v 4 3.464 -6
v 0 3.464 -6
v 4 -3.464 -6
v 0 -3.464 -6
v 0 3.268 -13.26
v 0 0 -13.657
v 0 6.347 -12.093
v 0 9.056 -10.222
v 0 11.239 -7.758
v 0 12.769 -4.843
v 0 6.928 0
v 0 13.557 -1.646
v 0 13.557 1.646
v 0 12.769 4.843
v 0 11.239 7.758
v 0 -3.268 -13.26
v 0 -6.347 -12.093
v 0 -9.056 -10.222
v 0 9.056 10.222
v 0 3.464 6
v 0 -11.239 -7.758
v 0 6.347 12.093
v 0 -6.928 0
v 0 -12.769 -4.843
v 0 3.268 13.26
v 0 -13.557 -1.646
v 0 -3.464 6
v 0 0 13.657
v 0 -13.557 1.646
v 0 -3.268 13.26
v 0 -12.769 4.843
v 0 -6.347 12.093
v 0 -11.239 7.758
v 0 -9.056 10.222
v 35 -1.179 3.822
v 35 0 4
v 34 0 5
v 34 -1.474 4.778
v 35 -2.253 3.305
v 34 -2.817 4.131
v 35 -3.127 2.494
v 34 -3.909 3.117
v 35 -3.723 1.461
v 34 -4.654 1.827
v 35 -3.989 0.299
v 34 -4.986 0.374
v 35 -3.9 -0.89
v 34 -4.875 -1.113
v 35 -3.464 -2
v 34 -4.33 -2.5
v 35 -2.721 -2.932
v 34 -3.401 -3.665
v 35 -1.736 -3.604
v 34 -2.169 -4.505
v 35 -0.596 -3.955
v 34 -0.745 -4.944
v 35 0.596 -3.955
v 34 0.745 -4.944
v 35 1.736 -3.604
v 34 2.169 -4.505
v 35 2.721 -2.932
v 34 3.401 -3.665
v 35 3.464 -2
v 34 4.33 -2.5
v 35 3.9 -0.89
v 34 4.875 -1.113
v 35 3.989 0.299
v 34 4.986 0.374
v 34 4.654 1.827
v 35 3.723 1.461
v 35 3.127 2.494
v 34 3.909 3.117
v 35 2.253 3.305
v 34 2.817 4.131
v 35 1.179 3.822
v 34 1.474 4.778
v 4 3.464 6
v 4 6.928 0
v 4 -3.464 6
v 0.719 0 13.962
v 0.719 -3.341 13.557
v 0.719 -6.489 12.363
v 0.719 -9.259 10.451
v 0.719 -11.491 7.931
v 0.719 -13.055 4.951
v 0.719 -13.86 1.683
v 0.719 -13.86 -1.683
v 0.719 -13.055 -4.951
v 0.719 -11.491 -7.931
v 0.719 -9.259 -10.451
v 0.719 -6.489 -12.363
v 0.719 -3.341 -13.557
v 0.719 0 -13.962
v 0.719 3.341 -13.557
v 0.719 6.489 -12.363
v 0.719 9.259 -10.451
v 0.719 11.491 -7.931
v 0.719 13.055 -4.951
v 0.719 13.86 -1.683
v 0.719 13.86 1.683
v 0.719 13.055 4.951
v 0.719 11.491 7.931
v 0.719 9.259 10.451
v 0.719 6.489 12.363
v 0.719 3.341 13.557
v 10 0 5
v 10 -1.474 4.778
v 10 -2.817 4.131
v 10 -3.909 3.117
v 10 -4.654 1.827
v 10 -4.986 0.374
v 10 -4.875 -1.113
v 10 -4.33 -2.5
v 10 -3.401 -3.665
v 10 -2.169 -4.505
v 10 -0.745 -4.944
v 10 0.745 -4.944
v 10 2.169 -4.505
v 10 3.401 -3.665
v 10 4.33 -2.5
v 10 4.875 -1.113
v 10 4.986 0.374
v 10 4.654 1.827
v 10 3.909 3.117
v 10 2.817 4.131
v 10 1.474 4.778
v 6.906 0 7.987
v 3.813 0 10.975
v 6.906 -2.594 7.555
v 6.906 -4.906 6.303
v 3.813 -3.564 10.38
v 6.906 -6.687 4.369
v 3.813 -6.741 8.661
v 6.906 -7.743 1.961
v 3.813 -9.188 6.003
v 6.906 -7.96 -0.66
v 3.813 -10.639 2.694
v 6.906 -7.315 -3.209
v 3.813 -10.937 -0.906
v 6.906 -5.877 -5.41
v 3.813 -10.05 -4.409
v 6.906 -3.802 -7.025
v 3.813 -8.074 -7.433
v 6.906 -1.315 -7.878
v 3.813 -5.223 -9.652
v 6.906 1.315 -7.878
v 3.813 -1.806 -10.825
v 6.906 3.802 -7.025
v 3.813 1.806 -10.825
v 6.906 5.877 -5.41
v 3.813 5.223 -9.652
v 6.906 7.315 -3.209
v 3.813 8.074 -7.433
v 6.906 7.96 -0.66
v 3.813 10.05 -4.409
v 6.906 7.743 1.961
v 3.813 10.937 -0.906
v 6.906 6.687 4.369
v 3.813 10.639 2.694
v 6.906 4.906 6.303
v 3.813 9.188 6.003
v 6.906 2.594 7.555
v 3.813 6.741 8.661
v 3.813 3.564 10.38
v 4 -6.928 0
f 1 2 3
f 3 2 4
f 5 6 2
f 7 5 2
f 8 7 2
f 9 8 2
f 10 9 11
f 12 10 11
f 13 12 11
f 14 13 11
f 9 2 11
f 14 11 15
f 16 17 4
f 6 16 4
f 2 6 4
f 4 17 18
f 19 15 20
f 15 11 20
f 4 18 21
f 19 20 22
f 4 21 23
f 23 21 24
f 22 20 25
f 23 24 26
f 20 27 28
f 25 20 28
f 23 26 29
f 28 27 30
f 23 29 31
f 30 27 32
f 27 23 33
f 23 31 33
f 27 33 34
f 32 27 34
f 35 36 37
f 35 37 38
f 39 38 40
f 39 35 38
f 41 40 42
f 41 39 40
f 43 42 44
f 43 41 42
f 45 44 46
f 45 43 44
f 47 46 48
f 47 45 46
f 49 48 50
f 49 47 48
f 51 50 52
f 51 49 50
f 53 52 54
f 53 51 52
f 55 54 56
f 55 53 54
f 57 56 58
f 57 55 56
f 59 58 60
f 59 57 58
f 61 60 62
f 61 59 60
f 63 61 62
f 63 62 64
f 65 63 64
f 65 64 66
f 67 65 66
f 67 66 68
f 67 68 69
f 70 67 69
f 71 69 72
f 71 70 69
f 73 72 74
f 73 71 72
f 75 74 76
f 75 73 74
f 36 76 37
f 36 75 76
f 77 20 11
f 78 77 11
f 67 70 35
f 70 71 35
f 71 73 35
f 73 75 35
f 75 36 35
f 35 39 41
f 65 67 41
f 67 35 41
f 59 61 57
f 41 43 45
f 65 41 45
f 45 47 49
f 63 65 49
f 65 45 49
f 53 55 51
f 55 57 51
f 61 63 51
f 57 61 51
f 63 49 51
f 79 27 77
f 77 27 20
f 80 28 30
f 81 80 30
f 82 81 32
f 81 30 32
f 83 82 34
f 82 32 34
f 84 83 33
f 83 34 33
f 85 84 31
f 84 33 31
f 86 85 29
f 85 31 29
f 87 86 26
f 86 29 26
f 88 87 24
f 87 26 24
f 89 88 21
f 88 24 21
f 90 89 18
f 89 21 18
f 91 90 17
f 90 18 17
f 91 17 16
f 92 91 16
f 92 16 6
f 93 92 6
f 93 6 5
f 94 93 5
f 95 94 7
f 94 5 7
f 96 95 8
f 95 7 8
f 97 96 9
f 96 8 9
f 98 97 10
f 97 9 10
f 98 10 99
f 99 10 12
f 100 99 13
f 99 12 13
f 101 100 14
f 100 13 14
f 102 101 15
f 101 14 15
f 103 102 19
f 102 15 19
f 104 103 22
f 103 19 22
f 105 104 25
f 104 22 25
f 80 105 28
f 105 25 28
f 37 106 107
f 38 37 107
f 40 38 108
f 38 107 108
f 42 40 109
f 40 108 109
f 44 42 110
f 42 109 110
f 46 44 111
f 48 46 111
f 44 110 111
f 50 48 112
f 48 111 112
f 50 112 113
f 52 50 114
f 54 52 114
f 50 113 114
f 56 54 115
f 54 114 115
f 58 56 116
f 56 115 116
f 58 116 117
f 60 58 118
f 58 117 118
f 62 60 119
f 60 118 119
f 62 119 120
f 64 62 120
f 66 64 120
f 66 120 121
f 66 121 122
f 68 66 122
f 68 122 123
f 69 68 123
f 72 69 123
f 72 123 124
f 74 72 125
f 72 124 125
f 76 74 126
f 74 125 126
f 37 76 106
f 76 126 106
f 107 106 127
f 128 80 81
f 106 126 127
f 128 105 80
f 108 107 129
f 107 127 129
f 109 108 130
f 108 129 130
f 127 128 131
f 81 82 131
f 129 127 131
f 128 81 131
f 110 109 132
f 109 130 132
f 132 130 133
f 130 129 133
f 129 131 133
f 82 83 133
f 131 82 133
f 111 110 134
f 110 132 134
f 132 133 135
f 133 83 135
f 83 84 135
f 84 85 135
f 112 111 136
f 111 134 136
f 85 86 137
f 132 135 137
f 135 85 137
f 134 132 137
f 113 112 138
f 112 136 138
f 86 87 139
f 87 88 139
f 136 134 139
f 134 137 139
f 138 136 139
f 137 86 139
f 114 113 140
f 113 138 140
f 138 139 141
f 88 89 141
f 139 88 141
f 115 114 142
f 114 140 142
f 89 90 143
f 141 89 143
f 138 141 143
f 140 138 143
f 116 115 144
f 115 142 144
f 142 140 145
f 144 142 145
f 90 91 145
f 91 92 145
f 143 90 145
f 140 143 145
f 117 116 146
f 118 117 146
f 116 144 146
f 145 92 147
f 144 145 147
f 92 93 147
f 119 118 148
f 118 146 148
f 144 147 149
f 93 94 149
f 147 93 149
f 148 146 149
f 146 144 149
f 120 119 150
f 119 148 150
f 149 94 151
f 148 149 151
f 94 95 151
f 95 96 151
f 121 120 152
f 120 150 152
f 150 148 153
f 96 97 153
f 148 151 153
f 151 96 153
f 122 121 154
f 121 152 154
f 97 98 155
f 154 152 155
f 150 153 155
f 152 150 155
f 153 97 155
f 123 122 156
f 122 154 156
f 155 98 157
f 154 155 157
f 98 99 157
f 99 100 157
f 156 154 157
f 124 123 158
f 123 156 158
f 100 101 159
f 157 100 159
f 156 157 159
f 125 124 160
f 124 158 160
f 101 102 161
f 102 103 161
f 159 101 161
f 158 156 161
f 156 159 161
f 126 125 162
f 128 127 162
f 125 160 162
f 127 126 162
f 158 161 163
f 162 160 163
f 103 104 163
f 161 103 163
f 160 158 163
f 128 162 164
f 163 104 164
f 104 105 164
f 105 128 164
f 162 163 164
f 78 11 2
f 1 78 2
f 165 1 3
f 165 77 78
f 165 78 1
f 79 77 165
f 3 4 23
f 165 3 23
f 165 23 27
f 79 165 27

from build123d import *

# Parameters (mm, degrees)
F3_DEPTH = 4
F4_SIZE  = 1
F5_SIZE  = 1


with BuildPart() as f1:
    # F0 (on Front) → F1 (revolve)
    with BuildSketch(Plane.XZ):
        Polygon((0, 14.656888), (0, 0), (35, 0), (35, 5), (10, 5), align=None)
    revolve(axis=Axis((41.428571, 0, 0), (1, 0, 0)))

    # F2 (on face) → F3 (cut)
    with BuildSketch(Plane(origin=(0, 0, 0), x_dir=(0, -1, 0), z_dir=(-1, 0, 0))):
        Polygon((-3.464102, -6), (3.464102, -6), (6.928203, 0), (3.464102, 6), (-3.464102, 6), (-6.928203, 0), align=None)
    extrude(amount=-F3_DEPTH, mode=Mode.SUBTRACT)

    # F4
    f4_edges = [f1.edges().sort_by_distance(p)[0] for p in [
        (35, 0, -5),
    ]]
    chamfer(f4_edges, length=F4_SIZE)

    # F5
    f5_edges = [f1.edges().sort_by_distance(p)[0] for p in [
        (0, 0, -14.656888),
    ]]
    chamfer(f5_edges, length=F5_SIZE)


solid = f1.part
